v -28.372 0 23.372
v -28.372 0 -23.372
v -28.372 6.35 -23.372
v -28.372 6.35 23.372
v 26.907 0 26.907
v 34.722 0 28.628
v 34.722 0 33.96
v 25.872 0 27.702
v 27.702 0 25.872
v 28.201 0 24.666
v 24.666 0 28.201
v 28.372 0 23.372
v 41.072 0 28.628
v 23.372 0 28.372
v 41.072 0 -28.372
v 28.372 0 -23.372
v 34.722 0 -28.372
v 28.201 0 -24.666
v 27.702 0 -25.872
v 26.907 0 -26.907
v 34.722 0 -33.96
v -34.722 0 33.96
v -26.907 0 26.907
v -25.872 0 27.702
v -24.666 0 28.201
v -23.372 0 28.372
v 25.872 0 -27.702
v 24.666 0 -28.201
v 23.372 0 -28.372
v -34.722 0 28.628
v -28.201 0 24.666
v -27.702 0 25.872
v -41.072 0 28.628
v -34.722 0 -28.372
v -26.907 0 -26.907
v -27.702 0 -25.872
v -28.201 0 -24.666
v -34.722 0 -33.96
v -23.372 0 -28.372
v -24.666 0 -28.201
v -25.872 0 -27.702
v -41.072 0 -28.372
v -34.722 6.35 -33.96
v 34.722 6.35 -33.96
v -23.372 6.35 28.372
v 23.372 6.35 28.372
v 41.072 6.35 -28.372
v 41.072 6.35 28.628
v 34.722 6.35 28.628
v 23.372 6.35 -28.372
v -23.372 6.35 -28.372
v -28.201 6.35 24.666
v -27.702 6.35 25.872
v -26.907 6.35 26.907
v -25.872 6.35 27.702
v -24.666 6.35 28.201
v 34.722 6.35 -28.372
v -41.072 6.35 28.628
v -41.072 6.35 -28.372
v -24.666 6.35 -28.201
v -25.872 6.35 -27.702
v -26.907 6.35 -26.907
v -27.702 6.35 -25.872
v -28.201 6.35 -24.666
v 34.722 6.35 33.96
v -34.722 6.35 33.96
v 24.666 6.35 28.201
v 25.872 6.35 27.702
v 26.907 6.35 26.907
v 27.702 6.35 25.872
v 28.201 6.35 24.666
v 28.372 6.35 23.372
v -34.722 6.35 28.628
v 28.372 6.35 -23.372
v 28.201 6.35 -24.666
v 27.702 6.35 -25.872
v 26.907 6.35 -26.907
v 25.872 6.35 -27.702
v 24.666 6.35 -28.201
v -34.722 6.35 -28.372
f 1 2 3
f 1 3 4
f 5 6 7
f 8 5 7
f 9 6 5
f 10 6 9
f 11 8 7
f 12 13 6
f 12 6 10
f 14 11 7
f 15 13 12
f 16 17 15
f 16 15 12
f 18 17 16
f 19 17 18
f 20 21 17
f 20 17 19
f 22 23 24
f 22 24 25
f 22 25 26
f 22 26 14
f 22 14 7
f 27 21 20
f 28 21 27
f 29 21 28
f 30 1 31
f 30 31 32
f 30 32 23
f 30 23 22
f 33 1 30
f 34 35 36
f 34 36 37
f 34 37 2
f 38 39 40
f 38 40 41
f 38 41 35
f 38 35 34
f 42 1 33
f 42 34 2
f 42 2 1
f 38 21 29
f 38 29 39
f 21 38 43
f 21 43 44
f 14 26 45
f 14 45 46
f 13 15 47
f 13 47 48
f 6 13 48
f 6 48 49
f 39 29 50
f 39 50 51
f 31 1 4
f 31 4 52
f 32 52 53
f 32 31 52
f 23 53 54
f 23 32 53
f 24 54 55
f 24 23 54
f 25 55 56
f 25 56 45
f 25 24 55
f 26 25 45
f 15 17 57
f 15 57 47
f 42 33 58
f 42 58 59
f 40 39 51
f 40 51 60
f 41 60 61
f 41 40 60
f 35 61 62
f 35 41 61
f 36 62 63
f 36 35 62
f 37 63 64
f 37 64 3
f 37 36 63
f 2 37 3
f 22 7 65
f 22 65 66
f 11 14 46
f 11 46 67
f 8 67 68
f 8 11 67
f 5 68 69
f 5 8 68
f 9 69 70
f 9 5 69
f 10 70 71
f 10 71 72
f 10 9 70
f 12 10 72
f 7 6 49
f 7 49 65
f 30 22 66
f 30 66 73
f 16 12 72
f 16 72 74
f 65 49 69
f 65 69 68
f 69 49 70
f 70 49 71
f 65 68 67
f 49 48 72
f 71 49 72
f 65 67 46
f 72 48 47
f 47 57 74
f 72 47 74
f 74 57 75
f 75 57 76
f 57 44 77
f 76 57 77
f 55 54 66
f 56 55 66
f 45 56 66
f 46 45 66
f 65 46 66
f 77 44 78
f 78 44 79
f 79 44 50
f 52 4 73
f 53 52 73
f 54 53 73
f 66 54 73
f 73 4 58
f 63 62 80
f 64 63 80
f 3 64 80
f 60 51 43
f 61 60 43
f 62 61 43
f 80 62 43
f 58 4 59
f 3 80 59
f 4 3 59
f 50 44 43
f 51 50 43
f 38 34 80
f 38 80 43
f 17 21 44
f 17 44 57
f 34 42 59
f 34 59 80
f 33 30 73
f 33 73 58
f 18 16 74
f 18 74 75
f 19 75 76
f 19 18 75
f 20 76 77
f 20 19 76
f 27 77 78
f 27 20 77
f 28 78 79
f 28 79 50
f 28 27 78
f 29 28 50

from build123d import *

# Parameters (mm, degrees)
BOSS_EXTRUDE1_DEPTH = 6.35


with BuildPart() as part:
    # Sketch1 → Boss-Extrude1 (new body)
    with BuildSketch(Plane(origin=(0, 0, 0), x_dir=(1, 0, 0), z_dir=(0, 1, 0))):
        Polygon((-41.0718, -28.6282), (-41.0718, 28.3718), (-34.7218, 28.3718), (-34.7218, 33.9598), (34.7218, 33.9598), (34.7218, 28.3718), (41.0718, 28.3718), (41.0718, -28.6282), (34.7218, -28.6282), (34.7218, -33.9598), (-34.7218, -33.9598), (-34.7218, -28.6282), align=None)
        with BuildLine():
            Line((-23.3718, -28.3718), (23.3718, -28.3718))
            ThreePointArc((23.3718, -28.3718), (26.907333906, -26.907333906), (28.3718, -23.3718))
            Line((28.3718, -23.3718), (28.3718, 23.3718))
            ThreePointArc((28.3718, 23.3718), (26.907333906, 26.907333906), (23.3718, 28.3718))
            Line((23.3718, 28.3718), (-23.3718, 28.3718))
            ThreePointArc((-23.3718, 28.3718), (-26.907333906, 26.907333906), (-28.3718, 23.3718))
            Line((-28.3718, 23.3718), (-28.3718, -23.3718))
            ThreePointArc((-28.3718, -23.3718), (-26.907333906, -26.907333906), (-23.3718, -28.3718))
        make_face(mode=Mode.SUBTRACT)
    extrude(amount=BOSS_EXTRUDE1_DEPTH)


solid = part.part
